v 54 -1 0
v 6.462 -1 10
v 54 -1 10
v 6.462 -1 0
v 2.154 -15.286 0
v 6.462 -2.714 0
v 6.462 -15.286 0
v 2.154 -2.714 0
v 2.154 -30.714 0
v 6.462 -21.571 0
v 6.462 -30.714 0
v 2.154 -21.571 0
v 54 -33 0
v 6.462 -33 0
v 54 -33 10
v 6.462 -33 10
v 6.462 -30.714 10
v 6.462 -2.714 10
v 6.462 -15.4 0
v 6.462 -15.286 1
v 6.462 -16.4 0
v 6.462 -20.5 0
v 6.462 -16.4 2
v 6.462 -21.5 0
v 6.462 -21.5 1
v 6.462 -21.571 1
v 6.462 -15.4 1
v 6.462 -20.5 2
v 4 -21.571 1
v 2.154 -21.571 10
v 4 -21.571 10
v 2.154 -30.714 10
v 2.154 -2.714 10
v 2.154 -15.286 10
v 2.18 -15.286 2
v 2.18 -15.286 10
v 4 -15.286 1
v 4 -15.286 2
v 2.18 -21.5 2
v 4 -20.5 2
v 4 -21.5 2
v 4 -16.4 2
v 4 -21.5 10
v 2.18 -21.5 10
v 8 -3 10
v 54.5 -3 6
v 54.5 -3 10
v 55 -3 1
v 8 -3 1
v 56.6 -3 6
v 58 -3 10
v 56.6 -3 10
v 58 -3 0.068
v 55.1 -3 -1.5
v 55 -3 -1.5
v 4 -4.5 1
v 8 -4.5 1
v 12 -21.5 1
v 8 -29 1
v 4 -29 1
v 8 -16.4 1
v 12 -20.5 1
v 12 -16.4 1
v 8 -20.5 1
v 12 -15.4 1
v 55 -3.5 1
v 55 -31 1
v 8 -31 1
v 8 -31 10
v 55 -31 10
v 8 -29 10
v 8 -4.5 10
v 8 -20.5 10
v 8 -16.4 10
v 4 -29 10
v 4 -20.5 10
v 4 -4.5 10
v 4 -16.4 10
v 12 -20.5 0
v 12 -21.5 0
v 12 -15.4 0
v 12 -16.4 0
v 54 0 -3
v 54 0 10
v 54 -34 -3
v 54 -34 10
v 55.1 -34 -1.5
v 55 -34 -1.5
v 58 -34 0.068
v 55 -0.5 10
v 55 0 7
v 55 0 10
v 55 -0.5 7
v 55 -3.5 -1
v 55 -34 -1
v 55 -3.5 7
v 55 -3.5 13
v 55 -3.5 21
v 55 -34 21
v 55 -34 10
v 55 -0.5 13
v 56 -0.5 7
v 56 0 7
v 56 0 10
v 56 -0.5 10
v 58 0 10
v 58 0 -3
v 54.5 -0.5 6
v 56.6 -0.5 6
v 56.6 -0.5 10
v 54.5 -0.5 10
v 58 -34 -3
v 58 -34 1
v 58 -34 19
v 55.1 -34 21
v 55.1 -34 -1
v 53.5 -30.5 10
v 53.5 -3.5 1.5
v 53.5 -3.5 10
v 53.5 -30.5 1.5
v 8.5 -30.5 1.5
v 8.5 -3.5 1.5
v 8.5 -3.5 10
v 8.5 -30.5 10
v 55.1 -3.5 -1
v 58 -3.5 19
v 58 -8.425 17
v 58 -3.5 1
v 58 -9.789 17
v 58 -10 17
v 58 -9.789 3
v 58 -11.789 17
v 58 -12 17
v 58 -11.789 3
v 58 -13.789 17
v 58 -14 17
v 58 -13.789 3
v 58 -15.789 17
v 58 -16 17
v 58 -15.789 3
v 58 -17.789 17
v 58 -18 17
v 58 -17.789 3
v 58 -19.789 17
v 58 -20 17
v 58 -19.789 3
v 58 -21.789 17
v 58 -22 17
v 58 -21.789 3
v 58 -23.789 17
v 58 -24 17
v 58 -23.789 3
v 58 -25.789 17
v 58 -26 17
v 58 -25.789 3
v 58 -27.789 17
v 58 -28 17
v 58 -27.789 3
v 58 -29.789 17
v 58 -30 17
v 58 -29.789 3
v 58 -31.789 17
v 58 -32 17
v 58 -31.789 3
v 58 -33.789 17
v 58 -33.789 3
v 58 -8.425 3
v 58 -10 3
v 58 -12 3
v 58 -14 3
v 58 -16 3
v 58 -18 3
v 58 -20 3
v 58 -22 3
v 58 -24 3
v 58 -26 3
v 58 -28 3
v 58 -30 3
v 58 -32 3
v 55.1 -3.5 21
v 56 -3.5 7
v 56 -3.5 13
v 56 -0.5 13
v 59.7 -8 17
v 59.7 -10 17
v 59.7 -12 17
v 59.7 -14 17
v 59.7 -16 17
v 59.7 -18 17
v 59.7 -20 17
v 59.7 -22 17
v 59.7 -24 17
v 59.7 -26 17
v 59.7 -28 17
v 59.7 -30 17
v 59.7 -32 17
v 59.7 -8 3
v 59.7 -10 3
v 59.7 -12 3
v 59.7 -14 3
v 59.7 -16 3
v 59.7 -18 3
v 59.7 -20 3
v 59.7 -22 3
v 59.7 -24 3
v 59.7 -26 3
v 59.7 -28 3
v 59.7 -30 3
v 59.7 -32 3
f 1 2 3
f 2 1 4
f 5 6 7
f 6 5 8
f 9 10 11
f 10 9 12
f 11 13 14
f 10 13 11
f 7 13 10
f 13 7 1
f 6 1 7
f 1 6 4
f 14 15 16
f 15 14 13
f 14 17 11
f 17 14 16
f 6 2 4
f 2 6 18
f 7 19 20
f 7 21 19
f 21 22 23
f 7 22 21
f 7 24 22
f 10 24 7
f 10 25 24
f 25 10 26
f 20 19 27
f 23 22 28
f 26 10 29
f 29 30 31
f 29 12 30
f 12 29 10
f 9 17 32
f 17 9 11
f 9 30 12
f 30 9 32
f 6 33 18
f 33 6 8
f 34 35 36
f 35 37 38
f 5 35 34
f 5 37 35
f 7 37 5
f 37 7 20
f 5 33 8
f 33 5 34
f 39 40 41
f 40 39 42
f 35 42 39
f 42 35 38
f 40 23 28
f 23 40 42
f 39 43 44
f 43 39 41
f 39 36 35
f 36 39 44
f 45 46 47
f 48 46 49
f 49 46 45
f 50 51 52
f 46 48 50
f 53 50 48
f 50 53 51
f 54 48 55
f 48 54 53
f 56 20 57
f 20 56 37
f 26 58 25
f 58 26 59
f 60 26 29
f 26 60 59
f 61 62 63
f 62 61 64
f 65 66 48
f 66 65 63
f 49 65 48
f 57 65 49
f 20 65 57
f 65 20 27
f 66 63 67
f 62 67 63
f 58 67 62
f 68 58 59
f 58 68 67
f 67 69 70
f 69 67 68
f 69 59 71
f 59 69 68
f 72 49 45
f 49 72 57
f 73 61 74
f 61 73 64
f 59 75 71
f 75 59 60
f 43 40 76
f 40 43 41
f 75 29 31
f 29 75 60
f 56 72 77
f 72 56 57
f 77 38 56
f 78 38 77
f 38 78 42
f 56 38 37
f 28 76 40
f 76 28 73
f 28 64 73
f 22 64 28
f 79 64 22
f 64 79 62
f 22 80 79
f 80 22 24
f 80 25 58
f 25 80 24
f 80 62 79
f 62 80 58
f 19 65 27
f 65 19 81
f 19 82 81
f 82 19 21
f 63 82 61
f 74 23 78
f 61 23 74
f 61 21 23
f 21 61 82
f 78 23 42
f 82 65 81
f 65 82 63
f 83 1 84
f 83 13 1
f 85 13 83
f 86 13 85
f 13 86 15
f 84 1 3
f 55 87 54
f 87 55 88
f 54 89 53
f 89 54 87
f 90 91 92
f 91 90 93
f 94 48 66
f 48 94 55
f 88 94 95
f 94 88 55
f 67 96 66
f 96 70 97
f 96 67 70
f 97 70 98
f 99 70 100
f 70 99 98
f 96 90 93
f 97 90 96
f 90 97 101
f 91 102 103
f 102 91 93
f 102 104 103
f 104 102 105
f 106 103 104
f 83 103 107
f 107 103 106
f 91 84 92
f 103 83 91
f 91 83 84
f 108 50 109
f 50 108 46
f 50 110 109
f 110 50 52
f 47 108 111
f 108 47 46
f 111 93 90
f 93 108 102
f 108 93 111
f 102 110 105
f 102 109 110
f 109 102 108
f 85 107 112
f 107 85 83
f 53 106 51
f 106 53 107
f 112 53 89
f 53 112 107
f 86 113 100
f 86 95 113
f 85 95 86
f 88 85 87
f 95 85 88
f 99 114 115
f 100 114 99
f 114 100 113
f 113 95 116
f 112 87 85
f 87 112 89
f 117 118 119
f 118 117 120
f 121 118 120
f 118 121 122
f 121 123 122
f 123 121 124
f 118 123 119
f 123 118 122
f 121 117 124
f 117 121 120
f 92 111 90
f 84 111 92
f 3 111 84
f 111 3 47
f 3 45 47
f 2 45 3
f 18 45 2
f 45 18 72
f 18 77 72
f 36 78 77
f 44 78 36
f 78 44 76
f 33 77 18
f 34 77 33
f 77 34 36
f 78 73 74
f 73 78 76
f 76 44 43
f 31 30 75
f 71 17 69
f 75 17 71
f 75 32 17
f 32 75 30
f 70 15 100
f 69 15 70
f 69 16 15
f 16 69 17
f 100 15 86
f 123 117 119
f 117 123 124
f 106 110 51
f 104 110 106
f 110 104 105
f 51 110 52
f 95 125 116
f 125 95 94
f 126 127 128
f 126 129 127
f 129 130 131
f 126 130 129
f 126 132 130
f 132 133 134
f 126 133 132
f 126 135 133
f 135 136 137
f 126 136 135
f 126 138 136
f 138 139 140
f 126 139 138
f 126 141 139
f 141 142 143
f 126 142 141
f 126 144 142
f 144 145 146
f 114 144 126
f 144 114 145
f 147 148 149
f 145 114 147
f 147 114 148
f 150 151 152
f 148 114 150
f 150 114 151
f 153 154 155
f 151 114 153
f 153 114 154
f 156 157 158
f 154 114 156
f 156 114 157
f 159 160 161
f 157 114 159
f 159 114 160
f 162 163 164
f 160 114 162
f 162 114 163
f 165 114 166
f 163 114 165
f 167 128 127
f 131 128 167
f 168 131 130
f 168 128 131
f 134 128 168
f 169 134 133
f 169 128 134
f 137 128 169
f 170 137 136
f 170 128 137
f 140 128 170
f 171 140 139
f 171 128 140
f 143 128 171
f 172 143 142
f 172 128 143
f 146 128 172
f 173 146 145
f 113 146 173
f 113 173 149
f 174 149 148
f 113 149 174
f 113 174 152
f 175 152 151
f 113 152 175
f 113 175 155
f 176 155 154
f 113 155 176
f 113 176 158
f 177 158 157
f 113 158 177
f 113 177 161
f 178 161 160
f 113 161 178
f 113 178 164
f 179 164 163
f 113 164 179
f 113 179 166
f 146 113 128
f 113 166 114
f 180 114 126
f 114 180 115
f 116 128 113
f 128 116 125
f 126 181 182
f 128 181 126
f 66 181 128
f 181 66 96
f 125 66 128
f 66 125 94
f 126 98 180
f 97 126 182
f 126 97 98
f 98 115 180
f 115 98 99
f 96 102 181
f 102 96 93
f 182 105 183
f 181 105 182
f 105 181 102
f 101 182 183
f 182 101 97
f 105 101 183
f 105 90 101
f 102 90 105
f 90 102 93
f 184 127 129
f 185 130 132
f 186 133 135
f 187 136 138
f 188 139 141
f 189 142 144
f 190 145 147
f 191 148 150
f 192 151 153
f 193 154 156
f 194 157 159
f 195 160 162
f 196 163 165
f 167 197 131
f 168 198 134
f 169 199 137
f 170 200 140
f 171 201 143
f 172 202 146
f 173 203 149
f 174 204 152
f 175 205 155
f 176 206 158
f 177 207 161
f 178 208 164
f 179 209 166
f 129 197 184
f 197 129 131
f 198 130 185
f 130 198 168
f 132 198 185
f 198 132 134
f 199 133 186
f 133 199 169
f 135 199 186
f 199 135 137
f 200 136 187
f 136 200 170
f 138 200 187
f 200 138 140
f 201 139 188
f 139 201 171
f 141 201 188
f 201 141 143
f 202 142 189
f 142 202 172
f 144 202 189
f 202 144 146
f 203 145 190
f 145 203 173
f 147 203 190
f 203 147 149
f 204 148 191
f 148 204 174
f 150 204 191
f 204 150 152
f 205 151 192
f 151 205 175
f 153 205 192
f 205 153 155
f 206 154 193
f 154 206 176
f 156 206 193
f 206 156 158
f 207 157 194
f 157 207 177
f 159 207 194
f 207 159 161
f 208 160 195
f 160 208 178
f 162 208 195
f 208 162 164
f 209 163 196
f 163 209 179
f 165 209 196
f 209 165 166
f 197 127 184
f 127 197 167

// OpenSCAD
// file: slide_cover.scad
// Cover assmebly for a battery or similar compartment. slide_cover_base
// should be included in the object, since it provides the rails to accpet
// the cover. slide_cover makes the actual lid.

// Part of the components library.

// By Nenad Rijavec
// Feel free to use, share, modify, etc. as you see fit.

do_build = 1 ;
bld_base = 0 ;
bld_cover = 1 ;
cover_w = 19 ;
cover_l = 27 ;
lid_h = 3 ;
tab_w = 6 ;

module slide_cover( cover_w, cover_l, lid_h  )
{
	// sliding plate
	hull() union() {
		cube( [ cover_w+4, cover_l, 0.1 ] ) ;
		translate( [ 2, 0, lid_h-0.1 ] ) 
		cube( [ cover_w, cover_l, 0.1 ] ) ;
	}
	// lock tab
	translate( [ 2+(cover_w-tab_w)/2, cover_l-1, 0 ] )
		cube( [ tab_w, 4, 1 ] ) ;
	// friction area for opening
	f_w = cover_w - 4 ;
	f_l = cover_l > 10 ? cover_l-5 : cover_l-2 ;

	pts = concat( 
		[ [0,0] ],
		[ for (i=[0:1:f_l])
			[for (j=[0:1])
				j==0 ? 
					(i+i%2) : (i%2==0?0.1:2)
		] ],
		[ [f_l,0]]
	) ;
	translate( [ 4, 0, lid_h-0.3 ] )
	rotate( [ 90, 0, 90 ] )
	linear_extrude( f_w ) polygon( pts ) ;


}

module slide_cover_base( cover_w, cover_l, lid_h )
{
	frame_w = 4 ;
	difference() {
		cube( [ cover_w + 2*frame_w, cover_l+2*frame_w, lid_h+1 ] ) ; 
		union() {
			translate( [ frame_w, frame_w-1, -1 ] )
				cube( [ cover_w, cover_l+2, lid_h+4 ] ) ;
			translate( [ frame_w-2.5, -1, 1 ] )
			slide_cover( cover_w+1, cover_l+frame_w+2, lid_h + 0.8 ) ;
			translate( [ frame_w+(cover_w-(tab_w+2))/2,
			frame_w+cover_l-1, 0.5 ] )
				cube( [ tab_w+2, 4.5, 2.1 ] ) ;
		}
	}
	
}

if ( do_build ) {
	if ( bld_cover )
		slide_cover( cover_w-1, cover_l+3.5, lid_h ) ;
	if ( bld_base ) 
		translate( [ bld_cover * (cover_w+5 ), 0, 0 ] )
			slide_cover_base( cover_w, cover_l, lid_h ) ;
			
} else {
	color("red")translate( [ 2.0, -0.1, 1.1 ] )
		slide_cover( cover_w, cover_l+3.5, lid_h ) ;
	slide_cover_base( cover_w, cover_l, lid_h ) ;
}
// main file
// Battery container to for 9V battery. Contains two versions.
// 9v_box_outline is basic and, if used, the opening and lid must be
// constructed separately (see slide_cover.scad for a lid that was used in
// the tachometer). 9v_box contains a pop-up lid and so is a bit more
// complete.

// 9v_slide_box() builds a box with a holder for the slide cover. There are
// no support plates, meaning that the cover holder protrudes on three
// sides. Builds so the cover is inserted from above.

// The battery space is designed so that the battery fits in only one way.

// Part of the components library.

// By Nenad Rijavec
// Feel free to use, share, modify, etc. as you see fit.

use <slide_cover.scad>

do_build = 0 ;
do_outline = 0 ;
do_slide_box = 1 ;
// constants as functions since modules are called externally
function 9v_w() = 27 ;
function 9v_l() = 45 ; 
function 9v_h() = 17 ;
function c_off() = 6 ;
function c_plus() = 8 ;
function c_minus() = 11 ;
function c_l() = 6 ;
function wall() = 2 ;
// inner box dimensions, we allow 1mm space extra in each dimension
function box_w() = 9v_w() + 1 ;
function box_l() = 9v_l() + c_l() + 1.0 ;
function box_h() = 9v_h() + 1 ; 


module 9v_box_outline_base()
{
	union() {
		translate( [ 0, c_l(), 0 ] )
			cube([ box_w(), box_l()-c_l(), box_h() ]);
		translate( [ c_off()-c_plus()/2, wall(), 0 ] )
			cube( [ c_plus(), c_l()+1, box_h() ] ) ;
		translate( [ 9v_w()-c_off()-c_minus()/2, wall(), 0 ] )
			cube( [ c_minus(), c_l()+1, box_h() ] ) ;
	//	translate( [ wall(), wall()+c_l(), 0 ] )
	//		cube([ box_w()-2*wall(), box_l()-2*wall()-c_l(), box_h() ]);
	//	translate( [ wall()+c_off()-c_plus()/2, wall(), 0 ] )
	//		cube( [ c_plus(), c_l()+1, box_h() ] ) ;
	//	translate( [ wall()+9v_w()-c_off()-c_minus()/2, wall(), 0 ] )
	//		cube( [ c_minus(), c_l()+1, box_h() ] ) ;

	}
}

module 9v_box_outline() 
{
	facx=(box_w()+2*wall())/box_w() ;
	facy=(box_l()+2*wall())/box_l() ;
	facz=(box_h()+2)/box_h() ;
	difference() {
		union() {
			scale( [ facx, facy, facz ] ) 
			9v_box_outline_base( ) ;
			translate( [ c_off()+5.5, wall()+0.18, 0 ] )
				cube( [ 6.2+wall(), 7.82+wall(), box_h() ] ) ;
		}
		union() {
			translate( [ wall(), wall(), 1 ] ) //scale( [ 1, 1, 2 ] )
				9v_box_outline_base( ) ;
			// modify the contact holes
			translate( [ c_off()+5.5, wall()+2, 1 ] )
				cube( [ 1, 8, box_h()+1 ] ) ;
			translate( [ c_off()+10.6, wall()+2, 1 ] )
				cube( [ 1, 8, box_h()+1 ] ) ;
			// wire passthroughs
			translate( [ c_off()+2, wall()+5, wall()+5 ] )
			rotate( [ 90, 0, 0 ] )
				cylinder( 20, d=4, $fn=100 ) ;
			translate( [ 9v_w()-c_off()+2, wall()+5, wall()+5 ] )
			rotate( [ 90, 0, 0 ] )
				cylinder( 20, d=4, $fn=100 ) ;
		}
	}
}

module 9v_box( horiz_latch = 1 )
{
	difference() {
		union() {
			cube( [ box_w(), box_l(), box_h() ] ) ;
		}
		union() {
			translate( [ wall(), wall()+c_l(), wall() ] )
				cube([ box_w()-2*wall(),
				box_l()-2*wall()-c_l(), box_h() ]);
			translate( [ wall()+c_off()-c_plus()/2, wall(), wall() ] )
				cube( [ c_plus(), c_l()+1, box_h() ] ) ;
			translate( [ wall()+9v_w()-c_off()-c_minus()/2, wall(), wall() ] )
				cube( [ c_minus(), c_l()+1, box_h() ] ) ;
			translate( [ wall()+c_off(), wall()+5, wall()+2 ] )
			rotate( [ 90, 0, 0 ] )
			cylinder( 20, d=4, $fn=100 ) ;
			translate( [ wall()+9v_w()-c_off(), wall()+5, wall()+2 ] )
			rotate( [ 90, 0, 0 ] )
			cylinder( 20, d=4, $fn=100 ) ;
			if ( horiz_latch ) {
				translate( [ 1, 1, box_h()-2 ] )
					cube( [ box_w()-2, box_l()-2, 10 ] ) ;
				translate( [ box_w()/2-4.1, 1, box_h()-10 ] )
					cube( [ 8.1, 15, 15 ] ) ;
				translate( [ wall()+4.0, box_l()-4, box_h()-3 ] )
					cube( [ 6, 5, 2 ] ) ;
				translate( [ box_w()-wall()-10.0, box_l()-4, box_h()-3 ] )
					cube( [ 6, 5, 2 ] ) ;
				translate( [ box_w()/2-4, -1, box_h()-4 ] )
				cube( [ 8, 4, 2 ] ) ;
			}

		}
	}
}

module 9v_cover() {
	difference() {
		union() {
			cube( [ box_w()-3.5, box_l()-3.5, 2 ] ) ;
		}
		union() {
			translate( [ box_w()/2-6.75, -0.5, -1 ] )
				cube( [ 10, 5.0, 4 ] ) ;
		}
	}
	translate( [ box_w()/2-4.75, 1.5, 3.0 ] )
	rotate( [ 0, 90, 0 ] )
		cylinder( 6, d=2, $fn=100 ) ;
	translate( [ box_w()/2-4.75, 4.5, 0 ] )
			cube( [ 6, 1.5, 8.5 ] ) ;
	translate( [ box_w()/2-4.75, 1, 0 ] )
			cube( [ 6, 1.5, 8.5 ] ) ;
	translate( [ box_w()/2-4.75, 1, 7.5 ] )
			cube( [ 6, 4, 1 ] ) ;
	translate( [ wall()+2.75, box_l()-4, 2 ] )
	rotate( [ 0, 90, 0 ] )
	linear_extrude( height = 5 ) polygon( 
		points = [ [ 0,0], [2,0], [0,3 ] ] ) ;
	translate( [ box_w()-wall()-11.25, box_l()-4, 2 ] )
	rotate( [ 0, 90, 0 ] )
	linear_extrude( height = 5 ) polygon( 
		points = [ [ 0,0], [2,0], [0,3] ] ) ;
}

module 9v_slide_box( )
{
	// 9v holder 
	difference() {
		//translate( [ 0, 2+box_h(), 2+box_w() ] )
		translate( [ 0, 2+box_h(), 1+2*wall()+box_w() ] )
		rotate( [ 90, 0, 0 ] )
		rotate( [ 0, 0, -90 ] )
			9v_box_outline() ;
		// 9v cover knockout
		//translate( [ box_l()-1, 1, 3 ] )
		//cube( [ 20, box_h(), box_w()-6 ] ) ;
		translate( [ box_l()+1.9, wall()-1, wall()+1 ] )
		cube( [ 20, box_h()+2*wall(), box_w() ] ) ;
		translate( [ box_l()+2.0, -1, 0 ] )
		cube( [ 20, box_h()+2*wall(), box_w()+3*wall() ] ) ;
	}
	// 9v cover frame
	//translate( [ box_l()-2.5, 24.5, 34 ] ) 
	//translate( [ box_l()+wall(), 24.5, 34 ] ) 
	//rotate( [ -90, 0, 0 ] )
	//rotate( [ 0, 90, 0 ] )
		//slide_cover_base( 19, 26, 3 ) ;
	translate( [ box_l()+2, 23.0, 34 ] ) 
	rotate( [ -90, 0, 0 ] )
	rotate( [ 0, 90, 0 ] )
		slide_cover_base( 18, 26, 3 ) ;
}


if ( do_build ) {
	if ( do_slide_box ) {
		9v_slide_box() ;
	} else {
		9v_box() ;
		translate( [ box_w()+10, 0, 0 ] ) 9v_cover() ;
	}
} else if ( do_outline ) {
	//color( "red")
	//translate( [ 20, 20, 1 ] ) cube( [ 5, 1, 9v_h+3 ] ) ;
	//intersection() { cube( [ 100, 20, 100 ] ) ;
	9v_box_outline() ;
	//}
} else if ( do_slide_box ) {
	intersection() {
		union() {
			rotate( [ 90, 0, 0 ] )
			9v_slide_box() ;
			color( "red") 
			translate( [ 8.5, -30.5, 1.5 ] )
				cube( [ 45, 27, 17 ] ) ;
		}
		translate( [ -10, -70, -10 ] )
			cube( [ 100, 150, 20 ] ) ;
	}
		color( "blue" )
		translate( [ 55.0, -34, 21.0 ] )
		rotate( [ 0, 90, 0 ] )
		slide_cover( 18.0, 30.5, 3 ) ;
} else { 
	9v_box() ;
	//translate( [ box_w()-1.8, 1.8, box_h()+0 ] )
		//rotate( [ 0, 180, 0 ] )
		//9v_cover() ;
	translate( [ box_l()+15, 0, box_h() ] )
	rotate( [ 0, -90, 0 ] ) 
	rotate( [ 0, 0, 90 ] ) 
		9v_slide_box() ;
}
